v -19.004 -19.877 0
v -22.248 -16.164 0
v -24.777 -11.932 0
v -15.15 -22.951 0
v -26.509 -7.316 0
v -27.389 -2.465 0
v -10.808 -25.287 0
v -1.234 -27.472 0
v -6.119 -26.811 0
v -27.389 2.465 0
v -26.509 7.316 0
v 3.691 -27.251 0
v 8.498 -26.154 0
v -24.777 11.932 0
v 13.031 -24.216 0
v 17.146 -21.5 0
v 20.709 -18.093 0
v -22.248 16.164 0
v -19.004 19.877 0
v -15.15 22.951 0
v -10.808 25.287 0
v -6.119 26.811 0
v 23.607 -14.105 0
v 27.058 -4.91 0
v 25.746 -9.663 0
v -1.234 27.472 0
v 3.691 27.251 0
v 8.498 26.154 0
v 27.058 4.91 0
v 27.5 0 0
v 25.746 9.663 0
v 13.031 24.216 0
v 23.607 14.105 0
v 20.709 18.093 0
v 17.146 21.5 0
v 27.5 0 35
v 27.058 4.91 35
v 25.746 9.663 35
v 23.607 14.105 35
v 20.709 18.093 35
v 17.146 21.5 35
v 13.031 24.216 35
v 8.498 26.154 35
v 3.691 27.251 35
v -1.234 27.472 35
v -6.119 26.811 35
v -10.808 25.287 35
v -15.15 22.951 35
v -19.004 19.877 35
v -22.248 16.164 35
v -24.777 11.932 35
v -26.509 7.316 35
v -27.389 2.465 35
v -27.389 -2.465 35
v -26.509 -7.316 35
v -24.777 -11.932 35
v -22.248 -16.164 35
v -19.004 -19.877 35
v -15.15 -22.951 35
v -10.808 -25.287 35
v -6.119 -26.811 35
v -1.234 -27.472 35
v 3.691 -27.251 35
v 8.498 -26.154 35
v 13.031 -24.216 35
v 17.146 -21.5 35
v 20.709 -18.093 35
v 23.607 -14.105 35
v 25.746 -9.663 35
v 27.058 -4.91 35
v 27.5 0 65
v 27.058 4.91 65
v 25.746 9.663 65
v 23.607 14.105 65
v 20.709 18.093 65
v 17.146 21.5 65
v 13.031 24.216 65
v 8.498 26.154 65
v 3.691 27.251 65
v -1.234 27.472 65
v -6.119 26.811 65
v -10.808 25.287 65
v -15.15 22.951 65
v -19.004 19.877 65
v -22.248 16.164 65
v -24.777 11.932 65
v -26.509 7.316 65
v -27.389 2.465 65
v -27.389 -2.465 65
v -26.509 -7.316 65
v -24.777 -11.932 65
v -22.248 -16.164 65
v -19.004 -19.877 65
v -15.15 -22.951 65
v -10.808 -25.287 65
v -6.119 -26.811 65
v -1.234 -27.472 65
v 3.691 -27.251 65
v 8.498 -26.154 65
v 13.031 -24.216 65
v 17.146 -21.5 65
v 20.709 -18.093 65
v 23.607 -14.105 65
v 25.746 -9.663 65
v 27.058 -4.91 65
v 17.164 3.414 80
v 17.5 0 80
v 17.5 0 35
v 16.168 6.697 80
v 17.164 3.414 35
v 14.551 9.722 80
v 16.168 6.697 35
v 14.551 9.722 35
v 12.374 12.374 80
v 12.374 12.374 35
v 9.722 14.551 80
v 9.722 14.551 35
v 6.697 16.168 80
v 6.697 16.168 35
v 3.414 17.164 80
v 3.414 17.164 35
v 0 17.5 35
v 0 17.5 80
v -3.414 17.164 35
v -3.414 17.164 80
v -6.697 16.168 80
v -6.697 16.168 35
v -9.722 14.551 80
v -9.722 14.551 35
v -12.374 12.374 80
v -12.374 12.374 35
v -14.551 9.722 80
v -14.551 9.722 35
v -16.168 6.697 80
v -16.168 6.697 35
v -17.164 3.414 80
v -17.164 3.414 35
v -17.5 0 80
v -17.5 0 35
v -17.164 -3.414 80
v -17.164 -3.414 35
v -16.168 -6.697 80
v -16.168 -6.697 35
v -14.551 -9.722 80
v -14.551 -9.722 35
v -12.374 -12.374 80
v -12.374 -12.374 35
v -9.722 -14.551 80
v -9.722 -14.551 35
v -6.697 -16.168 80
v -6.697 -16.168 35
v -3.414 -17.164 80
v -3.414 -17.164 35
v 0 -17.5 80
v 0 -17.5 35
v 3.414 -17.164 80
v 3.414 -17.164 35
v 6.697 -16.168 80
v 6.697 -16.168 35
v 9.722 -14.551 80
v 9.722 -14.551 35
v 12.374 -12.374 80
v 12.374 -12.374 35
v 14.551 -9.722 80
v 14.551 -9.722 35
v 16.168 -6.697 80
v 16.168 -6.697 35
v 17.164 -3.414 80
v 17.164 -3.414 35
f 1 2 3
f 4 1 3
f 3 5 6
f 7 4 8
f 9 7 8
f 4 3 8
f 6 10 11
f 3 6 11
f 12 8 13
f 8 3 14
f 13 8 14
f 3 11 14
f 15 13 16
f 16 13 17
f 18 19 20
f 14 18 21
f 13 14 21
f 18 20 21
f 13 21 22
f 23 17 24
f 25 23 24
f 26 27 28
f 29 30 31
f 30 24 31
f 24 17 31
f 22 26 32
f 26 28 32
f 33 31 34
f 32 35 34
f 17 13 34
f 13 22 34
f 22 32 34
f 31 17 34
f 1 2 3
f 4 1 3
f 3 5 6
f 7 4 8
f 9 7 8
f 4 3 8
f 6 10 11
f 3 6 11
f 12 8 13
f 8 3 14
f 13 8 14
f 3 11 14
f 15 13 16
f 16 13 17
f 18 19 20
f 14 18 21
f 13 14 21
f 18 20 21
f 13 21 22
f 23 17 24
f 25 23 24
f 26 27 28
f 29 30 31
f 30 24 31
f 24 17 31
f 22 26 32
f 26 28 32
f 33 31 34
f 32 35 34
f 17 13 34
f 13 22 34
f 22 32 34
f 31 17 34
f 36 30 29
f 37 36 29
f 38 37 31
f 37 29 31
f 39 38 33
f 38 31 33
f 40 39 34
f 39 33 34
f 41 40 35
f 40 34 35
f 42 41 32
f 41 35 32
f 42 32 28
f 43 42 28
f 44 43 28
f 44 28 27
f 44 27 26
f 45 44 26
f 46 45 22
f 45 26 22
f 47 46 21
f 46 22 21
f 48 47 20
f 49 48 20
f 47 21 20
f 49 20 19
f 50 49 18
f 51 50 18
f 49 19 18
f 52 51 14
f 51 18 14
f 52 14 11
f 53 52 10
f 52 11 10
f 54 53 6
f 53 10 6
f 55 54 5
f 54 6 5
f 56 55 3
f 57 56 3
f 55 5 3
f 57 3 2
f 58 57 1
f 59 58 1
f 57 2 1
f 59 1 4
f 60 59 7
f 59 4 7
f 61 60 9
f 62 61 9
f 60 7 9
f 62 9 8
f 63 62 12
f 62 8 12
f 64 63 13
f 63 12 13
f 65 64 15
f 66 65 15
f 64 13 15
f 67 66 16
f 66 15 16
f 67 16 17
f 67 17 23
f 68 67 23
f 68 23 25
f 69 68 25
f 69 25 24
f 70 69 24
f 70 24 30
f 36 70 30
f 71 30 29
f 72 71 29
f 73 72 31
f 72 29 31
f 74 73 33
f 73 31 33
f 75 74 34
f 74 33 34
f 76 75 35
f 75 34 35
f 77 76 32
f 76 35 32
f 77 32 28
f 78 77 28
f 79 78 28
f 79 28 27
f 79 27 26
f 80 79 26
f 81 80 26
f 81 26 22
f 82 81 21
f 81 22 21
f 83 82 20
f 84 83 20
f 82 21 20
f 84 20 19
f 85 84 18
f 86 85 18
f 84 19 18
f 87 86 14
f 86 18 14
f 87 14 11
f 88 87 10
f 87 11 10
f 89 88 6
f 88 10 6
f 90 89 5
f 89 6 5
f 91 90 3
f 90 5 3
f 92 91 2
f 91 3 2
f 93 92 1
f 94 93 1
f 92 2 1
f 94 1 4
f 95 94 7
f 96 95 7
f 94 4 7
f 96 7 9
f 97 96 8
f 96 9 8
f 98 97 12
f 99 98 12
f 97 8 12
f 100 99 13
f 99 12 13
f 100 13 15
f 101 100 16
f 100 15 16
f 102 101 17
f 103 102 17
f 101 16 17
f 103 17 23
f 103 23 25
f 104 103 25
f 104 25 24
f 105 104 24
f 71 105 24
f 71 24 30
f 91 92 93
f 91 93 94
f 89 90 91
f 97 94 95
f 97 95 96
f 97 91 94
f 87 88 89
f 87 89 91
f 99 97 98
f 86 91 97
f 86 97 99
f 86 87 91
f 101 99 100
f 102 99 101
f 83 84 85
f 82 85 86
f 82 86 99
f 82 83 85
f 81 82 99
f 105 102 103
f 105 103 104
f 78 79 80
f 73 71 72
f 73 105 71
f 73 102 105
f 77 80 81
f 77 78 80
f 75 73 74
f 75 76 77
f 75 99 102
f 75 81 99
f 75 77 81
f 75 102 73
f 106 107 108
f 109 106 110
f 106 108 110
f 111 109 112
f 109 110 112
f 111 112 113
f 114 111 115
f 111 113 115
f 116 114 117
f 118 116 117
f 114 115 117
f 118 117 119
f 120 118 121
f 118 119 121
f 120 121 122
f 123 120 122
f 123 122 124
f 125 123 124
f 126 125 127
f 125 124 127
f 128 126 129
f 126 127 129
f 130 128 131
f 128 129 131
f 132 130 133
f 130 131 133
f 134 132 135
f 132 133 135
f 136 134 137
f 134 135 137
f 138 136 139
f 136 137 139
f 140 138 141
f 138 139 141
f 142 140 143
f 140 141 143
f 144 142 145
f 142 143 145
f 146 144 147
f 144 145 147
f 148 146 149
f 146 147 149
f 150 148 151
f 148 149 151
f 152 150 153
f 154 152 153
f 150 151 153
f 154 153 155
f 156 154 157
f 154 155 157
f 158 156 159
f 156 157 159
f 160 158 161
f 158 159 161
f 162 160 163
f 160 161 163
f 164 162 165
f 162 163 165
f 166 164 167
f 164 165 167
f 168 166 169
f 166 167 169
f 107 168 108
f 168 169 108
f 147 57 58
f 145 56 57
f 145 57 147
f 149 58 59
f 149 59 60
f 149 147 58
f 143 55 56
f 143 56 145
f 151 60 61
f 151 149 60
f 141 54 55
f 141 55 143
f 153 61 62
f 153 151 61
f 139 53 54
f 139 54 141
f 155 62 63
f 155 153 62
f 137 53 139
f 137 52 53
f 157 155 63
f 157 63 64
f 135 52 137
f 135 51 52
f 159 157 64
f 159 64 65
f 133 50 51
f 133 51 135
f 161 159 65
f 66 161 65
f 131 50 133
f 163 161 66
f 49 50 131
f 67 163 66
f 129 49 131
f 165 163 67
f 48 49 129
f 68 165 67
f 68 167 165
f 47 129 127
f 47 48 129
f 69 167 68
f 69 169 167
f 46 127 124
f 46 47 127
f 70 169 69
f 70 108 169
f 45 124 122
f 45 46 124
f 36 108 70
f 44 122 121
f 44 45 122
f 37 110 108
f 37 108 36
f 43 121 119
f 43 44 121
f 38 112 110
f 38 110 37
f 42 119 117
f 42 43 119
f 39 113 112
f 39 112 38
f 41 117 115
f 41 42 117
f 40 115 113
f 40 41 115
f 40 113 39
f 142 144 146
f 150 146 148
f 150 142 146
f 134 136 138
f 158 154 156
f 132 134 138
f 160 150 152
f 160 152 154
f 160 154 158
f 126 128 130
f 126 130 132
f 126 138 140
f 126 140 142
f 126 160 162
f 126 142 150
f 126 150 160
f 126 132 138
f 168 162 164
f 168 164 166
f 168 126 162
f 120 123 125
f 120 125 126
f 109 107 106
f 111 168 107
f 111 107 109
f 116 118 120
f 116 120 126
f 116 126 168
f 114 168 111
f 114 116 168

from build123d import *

# Parameters (mm, degrees)
SKETCH_R     = 27.5
PAD_DEPTH    = 35
SKETCH001_R  = 17.5
PAD001_DEPTH = 45
SKETCH002_R  = 27.5
PAD002_DEPTH = 65


with BuildPart() as body:
    # Sketch → Pad (new body)
    with BuildSketch(Plane.XY):
        Circle(SKETCH_R)
    extrude(amount=PAD_DEPTH)

    # Sketch001 (on Face3 of Pad) → Pad001 (join)
    with BuildSketch(Plane.XY.offset(35)):
        Circle(SKETCH001_R)
    extrude(amount=PAD001_DEPTH)


with BuildPart() as body001:
    # Sketch002 → Pad002 (new body)
    with BuildSketch(Plane.XY):
        Circle(SKETCH002_R)
    extrude(amount=PAD002_DEPTH)


solid = Compound([body.part, body001.part])
